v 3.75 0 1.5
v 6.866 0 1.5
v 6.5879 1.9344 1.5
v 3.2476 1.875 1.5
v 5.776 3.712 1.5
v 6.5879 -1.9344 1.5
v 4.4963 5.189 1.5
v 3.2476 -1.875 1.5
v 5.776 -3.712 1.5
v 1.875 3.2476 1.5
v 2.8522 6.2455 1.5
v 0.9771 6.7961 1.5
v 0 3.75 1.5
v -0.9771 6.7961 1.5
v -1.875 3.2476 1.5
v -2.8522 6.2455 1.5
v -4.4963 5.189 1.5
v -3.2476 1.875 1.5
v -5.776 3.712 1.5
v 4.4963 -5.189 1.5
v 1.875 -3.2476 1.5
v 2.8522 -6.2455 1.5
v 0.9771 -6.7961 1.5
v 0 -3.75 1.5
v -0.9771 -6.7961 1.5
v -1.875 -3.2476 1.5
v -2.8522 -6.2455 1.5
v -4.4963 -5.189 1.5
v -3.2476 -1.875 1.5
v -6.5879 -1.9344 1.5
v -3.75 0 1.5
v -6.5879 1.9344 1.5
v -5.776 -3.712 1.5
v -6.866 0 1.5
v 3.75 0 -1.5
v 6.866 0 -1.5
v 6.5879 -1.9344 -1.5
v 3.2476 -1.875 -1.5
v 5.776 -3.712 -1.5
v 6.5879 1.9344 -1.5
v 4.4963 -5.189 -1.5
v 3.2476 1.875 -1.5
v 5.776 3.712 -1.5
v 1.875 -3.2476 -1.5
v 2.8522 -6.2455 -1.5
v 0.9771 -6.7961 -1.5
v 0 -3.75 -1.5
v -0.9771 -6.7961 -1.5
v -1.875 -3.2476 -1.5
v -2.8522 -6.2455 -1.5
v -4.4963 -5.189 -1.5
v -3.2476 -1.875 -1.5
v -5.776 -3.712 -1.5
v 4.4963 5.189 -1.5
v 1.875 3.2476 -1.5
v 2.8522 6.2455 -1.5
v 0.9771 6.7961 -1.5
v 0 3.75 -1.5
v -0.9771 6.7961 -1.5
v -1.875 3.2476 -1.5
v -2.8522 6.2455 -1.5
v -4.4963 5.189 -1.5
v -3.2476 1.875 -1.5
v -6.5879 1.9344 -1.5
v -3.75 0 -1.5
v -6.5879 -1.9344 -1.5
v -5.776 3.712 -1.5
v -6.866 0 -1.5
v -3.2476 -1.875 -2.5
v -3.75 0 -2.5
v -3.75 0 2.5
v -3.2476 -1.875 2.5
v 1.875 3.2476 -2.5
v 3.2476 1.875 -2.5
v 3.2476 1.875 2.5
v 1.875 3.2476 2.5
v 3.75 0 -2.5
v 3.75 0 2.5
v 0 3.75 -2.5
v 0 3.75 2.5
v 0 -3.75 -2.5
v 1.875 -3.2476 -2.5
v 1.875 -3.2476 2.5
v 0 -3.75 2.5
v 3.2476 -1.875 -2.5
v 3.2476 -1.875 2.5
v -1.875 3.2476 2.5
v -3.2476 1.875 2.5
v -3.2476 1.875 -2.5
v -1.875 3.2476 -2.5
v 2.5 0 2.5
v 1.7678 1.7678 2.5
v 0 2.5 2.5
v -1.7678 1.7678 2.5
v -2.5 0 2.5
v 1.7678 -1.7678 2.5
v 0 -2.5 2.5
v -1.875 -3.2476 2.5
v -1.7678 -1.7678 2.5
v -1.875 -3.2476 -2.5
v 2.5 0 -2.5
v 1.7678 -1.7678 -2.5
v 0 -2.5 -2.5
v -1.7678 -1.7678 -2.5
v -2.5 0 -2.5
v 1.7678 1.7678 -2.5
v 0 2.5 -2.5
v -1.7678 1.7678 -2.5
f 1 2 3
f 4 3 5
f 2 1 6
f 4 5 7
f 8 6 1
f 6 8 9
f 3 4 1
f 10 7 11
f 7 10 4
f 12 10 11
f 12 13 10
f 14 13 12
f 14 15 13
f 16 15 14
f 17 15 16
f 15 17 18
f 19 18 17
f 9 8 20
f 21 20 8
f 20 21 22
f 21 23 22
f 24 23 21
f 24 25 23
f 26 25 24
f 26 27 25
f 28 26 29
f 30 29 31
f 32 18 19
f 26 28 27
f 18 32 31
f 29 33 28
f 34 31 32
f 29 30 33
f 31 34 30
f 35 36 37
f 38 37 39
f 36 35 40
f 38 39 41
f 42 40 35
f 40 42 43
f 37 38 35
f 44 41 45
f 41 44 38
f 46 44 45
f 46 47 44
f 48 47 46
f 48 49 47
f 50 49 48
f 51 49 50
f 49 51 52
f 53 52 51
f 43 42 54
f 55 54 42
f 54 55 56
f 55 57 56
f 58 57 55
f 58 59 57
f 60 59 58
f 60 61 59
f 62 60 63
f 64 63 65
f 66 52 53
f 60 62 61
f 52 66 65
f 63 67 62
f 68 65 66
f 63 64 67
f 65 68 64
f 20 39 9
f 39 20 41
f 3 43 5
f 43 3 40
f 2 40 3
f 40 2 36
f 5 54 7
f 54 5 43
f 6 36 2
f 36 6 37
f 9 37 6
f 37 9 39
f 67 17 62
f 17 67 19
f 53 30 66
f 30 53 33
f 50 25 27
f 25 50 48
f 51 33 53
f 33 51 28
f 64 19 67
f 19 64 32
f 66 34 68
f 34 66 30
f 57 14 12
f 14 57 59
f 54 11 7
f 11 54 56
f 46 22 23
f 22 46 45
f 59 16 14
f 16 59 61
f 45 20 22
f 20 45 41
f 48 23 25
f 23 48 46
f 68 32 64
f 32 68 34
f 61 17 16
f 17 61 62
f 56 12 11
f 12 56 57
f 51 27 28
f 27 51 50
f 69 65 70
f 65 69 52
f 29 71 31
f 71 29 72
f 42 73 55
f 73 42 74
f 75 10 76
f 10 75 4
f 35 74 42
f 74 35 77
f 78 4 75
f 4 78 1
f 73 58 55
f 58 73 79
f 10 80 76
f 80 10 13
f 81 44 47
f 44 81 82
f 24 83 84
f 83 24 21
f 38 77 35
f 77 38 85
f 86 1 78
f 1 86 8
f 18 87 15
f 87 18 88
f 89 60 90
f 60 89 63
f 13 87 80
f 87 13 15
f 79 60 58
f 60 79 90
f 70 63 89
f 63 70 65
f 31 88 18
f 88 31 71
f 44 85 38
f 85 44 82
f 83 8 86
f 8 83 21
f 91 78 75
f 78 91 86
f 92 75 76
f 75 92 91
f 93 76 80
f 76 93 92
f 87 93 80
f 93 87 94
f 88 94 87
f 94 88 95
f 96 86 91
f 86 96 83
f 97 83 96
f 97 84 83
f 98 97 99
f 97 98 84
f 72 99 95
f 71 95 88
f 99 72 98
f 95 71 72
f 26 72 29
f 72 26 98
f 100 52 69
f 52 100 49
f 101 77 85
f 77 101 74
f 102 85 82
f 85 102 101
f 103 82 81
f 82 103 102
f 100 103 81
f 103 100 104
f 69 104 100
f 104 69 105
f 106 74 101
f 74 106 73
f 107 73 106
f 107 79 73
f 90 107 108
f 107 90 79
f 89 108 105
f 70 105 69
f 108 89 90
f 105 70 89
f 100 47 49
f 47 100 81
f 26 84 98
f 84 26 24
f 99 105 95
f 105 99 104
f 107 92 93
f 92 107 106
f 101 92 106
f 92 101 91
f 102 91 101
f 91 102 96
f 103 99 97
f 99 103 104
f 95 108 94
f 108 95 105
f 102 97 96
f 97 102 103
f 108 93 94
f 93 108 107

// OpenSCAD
// Parameters
primary_dimension = 5; //[2.5:10:0.1]
tooth_count = 20; //[10:60:1]
pitch_mm = 2; //[1:5:0.1]
bore_diameter_mm = 5; //[2.5:10:0.1]
belt_width_mm = 3; //[1.5:6:0.1]
tooth_height_mm = 0.5; //[0.25:1:0.05]
tooth_tangential_width_mm = 0.5; //[0.25:1:0.05]
tooth_section_width_mm = 3; //[1.5:6:0.1]
hub_diameter_mm = 7.5; //[3.75:15:0.1]
hub_length_mm = 5; //[2.5:10:0.1]
flange_enabled = 1; //[0:1:1]
flange_diameter_mm = 10; //[5:20:0.1]
flange_thickness_mm = 0.5; //[0:1:0.05]
overlap_mm = 0.5; //[0.2:1:0.1]
pulley_pitch_diameter_mm = 12.732; //[6.366:25.464:0.001]
pulley_outer_diameter_mm = 13.732; //[6.866:27.464:0.001]

// Base Shapes
module hub_body_cyl() {
  color("Silver")
  cylinder(r=hub_diameter_mm/2, h=hub_length_mm, center=true);
}

module toothed_outer_ring_cyl() {
  color("DimGray")
  cylinder(r=pulley_outer_diameter_mm/2, h=tooth_section_width_mm, center=true);
}

module tooth_box_raw() {
  color("Black")
  cube([tooth_height_mm, tooth_tangential_width_mm, tooth_section_width_mm], center=true);
}

module flange_disc_raw() {
  color("Silver")
  cylinder(r=flange_diameter_mm/2, h=flange_thickness_mm*flange_enabled, center=true);
}

module center_bore_cyl() {
  cylinder(r=bore_diameter_mm/2, h=hub_length_mm + tooth_section_width_mm + 2*flange_thickness_mm + 4*overlap_mm, center=true);
}

// Operations
module tooth_box_pos() {
  translate([pulley_outer_diameter_mm/2 - tooth_height_mm/2 - overlap_mm, 0, 0])
    tooth_box_raw();
}

module printed_pulley_GT2_teeth() {
  for (i = [0:tooth_count-1]) {
    rotate([0, 0, i * 360/tooth_count])
      tooth_box_pos();
  }
}

module toothed_outer_profile() {
  union() {
    toothed_outer_ring_cyl();
    printed_pulley_GT2_teeth();
  }
}

module flange_top_pos() {
  translate([0, 0, tooth_section_width_mm/2 + (flange_thickness_mm*flange_enabled)/2 - overlap_mm])
    flange_disc_raw();
}

module flange_bottom_pos() {
  translate([0, 0, -tooth_section_width_mm/2 - (flange_thickness_mm*flange_enabled)/2 + overlap_mm])
    flange_disc_raw();
}

module belt_flanges() {
  union() {
    flange_top_pos();
    flange_bottom_pos();
  }
}

module pulley_solid_union() {
  union() {
    hub_body_cyl();
    toothed_outer_profile();
    belt_flanges();
  }
}

// Final Output
difference() {
  pulley_solid_union();
  center_bore_cyl();
}
